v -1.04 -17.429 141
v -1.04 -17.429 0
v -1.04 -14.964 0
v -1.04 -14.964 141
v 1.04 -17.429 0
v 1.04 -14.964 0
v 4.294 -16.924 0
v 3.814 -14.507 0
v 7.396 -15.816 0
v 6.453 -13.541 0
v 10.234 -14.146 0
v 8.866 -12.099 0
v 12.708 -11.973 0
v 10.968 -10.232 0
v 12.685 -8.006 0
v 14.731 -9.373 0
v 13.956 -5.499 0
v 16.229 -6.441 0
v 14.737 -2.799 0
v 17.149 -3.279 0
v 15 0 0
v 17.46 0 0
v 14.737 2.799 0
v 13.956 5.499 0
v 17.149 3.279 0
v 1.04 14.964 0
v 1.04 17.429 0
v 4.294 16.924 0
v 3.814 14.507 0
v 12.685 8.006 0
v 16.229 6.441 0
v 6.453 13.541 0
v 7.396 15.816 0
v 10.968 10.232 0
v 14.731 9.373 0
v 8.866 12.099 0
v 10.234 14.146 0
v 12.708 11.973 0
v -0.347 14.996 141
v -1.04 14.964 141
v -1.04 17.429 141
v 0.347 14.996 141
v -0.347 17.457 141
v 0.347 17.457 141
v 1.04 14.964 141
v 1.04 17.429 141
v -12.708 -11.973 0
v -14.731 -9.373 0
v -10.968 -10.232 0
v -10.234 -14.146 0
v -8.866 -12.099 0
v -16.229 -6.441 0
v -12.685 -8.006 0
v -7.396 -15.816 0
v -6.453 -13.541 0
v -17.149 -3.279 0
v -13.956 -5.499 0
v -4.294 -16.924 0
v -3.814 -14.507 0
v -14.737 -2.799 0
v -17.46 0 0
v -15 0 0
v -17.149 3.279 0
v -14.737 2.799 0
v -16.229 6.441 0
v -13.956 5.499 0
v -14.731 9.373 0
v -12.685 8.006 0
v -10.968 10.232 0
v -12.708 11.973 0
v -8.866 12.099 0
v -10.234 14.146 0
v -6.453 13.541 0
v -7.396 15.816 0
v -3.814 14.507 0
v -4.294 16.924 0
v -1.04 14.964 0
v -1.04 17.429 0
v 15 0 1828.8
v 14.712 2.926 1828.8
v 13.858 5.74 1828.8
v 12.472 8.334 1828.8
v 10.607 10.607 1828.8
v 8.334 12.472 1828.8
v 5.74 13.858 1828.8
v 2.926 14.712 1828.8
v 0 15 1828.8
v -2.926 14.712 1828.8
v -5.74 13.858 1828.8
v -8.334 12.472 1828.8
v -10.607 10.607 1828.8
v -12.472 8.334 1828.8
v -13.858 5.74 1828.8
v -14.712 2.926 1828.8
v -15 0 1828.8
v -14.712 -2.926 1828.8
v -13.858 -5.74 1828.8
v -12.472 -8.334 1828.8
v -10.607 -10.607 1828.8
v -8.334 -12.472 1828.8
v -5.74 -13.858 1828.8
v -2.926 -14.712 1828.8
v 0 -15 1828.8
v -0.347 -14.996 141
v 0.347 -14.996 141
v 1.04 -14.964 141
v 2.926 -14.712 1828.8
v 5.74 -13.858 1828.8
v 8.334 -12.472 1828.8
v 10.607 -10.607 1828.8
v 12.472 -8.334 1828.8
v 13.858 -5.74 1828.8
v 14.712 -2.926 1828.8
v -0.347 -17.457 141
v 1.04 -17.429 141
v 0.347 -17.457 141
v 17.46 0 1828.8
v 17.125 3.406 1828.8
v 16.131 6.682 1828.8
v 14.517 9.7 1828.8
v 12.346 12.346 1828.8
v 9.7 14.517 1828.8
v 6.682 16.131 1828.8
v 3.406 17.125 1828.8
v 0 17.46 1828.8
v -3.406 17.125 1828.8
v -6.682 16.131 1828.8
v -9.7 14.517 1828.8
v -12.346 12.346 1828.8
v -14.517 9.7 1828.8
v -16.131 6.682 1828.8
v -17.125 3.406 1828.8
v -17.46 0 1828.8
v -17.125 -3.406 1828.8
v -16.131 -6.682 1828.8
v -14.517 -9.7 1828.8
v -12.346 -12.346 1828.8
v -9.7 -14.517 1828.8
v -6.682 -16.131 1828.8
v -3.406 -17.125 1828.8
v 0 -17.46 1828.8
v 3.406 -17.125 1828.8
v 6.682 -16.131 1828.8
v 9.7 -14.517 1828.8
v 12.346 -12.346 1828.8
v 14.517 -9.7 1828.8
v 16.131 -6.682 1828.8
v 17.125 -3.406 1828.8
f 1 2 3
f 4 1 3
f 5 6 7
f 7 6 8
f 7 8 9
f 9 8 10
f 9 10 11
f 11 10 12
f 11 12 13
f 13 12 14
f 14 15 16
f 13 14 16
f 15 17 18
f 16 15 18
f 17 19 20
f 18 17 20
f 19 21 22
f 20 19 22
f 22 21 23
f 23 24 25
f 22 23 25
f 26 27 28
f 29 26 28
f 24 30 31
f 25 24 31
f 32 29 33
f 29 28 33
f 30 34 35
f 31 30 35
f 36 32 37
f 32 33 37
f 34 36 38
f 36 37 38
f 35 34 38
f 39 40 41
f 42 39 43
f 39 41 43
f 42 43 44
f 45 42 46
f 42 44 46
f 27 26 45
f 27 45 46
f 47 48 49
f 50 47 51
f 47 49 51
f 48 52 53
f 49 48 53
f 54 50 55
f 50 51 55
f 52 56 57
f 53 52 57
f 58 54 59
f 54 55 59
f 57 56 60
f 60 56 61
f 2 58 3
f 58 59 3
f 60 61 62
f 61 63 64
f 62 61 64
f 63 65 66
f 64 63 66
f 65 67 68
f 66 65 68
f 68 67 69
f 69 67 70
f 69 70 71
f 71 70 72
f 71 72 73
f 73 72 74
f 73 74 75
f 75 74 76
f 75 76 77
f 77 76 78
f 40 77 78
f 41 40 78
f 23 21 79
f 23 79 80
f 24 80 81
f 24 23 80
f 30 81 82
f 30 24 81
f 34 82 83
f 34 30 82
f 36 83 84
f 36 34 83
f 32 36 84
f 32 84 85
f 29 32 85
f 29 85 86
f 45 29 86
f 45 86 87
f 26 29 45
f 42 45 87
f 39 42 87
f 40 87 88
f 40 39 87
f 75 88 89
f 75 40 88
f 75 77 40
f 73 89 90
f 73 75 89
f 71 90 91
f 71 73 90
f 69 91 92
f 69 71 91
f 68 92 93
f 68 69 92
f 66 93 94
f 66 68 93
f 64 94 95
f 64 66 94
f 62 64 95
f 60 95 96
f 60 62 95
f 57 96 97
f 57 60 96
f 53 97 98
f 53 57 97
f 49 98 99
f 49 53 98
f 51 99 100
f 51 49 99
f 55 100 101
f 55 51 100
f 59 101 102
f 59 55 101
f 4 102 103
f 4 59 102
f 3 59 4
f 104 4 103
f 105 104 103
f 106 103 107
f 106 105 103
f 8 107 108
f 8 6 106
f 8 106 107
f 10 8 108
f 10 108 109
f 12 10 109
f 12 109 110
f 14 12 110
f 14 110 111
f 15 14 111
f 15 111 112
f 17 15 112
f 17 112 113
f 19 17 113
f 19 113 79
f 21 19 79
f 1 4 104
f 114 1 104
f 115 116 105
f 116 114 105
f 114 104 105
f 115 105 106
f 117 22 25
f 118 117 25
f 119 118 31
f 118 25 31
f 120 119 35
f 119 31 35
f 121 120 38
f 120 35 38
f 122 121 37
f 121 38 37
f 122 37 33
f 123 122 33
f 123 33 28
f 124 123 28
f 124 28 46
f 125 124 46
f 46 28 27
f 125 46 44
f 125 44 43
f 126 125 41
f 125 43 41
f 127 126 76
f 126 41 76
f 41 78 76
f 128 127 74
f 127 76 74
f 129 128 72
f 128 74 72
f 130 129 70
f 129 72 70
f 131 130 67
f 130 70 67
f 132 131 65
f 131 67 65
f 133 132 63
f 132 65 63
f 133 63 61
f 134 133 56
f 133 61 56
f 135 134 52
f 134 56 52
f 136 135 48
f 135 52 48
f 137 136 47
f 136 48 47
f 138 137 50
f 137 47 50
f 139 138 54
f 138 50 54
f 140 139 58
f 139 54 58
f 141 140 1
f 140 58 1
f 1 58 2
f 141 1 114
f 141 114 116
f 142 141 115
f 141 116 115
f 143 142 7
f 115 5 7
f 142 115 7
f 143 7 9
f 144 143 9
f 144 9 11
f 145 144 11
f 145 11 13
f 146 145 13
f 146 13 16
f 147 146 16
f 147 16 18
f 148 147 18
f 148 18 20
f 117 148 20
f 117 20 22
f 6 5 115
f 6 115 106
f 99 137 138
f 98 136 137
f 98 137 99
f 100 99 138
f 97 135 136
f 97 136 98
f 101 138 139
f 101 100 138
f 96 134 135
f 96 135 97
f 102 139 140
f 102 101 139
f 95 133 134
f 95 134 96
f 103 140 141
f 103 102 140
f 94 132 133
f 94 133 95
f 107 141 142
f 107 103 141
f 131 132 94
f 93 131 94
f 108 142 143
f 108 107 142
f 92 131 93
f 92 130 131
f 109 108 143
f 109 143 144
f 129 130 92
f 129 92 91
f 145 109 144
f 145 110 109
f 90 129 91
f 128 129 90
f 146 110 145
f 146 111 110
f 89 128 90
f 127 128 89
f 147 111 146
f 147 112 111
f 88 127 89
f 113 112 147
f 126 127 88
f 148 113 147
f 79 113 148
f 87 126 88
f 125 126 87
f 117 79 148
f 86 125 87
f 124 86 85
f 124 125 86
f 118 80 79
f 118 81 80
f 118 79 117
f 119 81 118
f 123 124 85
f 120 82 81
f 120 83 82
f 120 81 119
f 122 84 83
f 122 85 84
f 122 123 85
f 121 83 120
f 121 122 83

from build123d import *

# Parameters (mm, degrees)
SKETCH1_R           = 17.46
SKETCH1_R_2         = 15
BOSS_EXTRUDE1_DEPTH = 1828.8
SKETCH4_W           = 2.08
SKETCH4_H           = 50
CUT_EXTRUDE2_DEPTH  = 141


with BuildPart() as part:
    # Sketch1 → Boss-Extrude1 (new body)
    with BuildSketch(Plane.XY):
        Circle(SKETCH1_R)
        Circle(SKETCH1_R_2, mode=Mode.SUBTRACT)
    extrude(amount=BOSS_EXTRUDE1_DEPTH)

    # Sketch4 → Cut-Extrude2 (cut)
    with BuildSketch(Plane.XY):
        Rectangle(SKETCH4_W, SKETCH4_H)
    extrude(amount=CUT_EXTRUDE2_DEPTH, mode=Mode.SUBTRACT)


solid = part.part
